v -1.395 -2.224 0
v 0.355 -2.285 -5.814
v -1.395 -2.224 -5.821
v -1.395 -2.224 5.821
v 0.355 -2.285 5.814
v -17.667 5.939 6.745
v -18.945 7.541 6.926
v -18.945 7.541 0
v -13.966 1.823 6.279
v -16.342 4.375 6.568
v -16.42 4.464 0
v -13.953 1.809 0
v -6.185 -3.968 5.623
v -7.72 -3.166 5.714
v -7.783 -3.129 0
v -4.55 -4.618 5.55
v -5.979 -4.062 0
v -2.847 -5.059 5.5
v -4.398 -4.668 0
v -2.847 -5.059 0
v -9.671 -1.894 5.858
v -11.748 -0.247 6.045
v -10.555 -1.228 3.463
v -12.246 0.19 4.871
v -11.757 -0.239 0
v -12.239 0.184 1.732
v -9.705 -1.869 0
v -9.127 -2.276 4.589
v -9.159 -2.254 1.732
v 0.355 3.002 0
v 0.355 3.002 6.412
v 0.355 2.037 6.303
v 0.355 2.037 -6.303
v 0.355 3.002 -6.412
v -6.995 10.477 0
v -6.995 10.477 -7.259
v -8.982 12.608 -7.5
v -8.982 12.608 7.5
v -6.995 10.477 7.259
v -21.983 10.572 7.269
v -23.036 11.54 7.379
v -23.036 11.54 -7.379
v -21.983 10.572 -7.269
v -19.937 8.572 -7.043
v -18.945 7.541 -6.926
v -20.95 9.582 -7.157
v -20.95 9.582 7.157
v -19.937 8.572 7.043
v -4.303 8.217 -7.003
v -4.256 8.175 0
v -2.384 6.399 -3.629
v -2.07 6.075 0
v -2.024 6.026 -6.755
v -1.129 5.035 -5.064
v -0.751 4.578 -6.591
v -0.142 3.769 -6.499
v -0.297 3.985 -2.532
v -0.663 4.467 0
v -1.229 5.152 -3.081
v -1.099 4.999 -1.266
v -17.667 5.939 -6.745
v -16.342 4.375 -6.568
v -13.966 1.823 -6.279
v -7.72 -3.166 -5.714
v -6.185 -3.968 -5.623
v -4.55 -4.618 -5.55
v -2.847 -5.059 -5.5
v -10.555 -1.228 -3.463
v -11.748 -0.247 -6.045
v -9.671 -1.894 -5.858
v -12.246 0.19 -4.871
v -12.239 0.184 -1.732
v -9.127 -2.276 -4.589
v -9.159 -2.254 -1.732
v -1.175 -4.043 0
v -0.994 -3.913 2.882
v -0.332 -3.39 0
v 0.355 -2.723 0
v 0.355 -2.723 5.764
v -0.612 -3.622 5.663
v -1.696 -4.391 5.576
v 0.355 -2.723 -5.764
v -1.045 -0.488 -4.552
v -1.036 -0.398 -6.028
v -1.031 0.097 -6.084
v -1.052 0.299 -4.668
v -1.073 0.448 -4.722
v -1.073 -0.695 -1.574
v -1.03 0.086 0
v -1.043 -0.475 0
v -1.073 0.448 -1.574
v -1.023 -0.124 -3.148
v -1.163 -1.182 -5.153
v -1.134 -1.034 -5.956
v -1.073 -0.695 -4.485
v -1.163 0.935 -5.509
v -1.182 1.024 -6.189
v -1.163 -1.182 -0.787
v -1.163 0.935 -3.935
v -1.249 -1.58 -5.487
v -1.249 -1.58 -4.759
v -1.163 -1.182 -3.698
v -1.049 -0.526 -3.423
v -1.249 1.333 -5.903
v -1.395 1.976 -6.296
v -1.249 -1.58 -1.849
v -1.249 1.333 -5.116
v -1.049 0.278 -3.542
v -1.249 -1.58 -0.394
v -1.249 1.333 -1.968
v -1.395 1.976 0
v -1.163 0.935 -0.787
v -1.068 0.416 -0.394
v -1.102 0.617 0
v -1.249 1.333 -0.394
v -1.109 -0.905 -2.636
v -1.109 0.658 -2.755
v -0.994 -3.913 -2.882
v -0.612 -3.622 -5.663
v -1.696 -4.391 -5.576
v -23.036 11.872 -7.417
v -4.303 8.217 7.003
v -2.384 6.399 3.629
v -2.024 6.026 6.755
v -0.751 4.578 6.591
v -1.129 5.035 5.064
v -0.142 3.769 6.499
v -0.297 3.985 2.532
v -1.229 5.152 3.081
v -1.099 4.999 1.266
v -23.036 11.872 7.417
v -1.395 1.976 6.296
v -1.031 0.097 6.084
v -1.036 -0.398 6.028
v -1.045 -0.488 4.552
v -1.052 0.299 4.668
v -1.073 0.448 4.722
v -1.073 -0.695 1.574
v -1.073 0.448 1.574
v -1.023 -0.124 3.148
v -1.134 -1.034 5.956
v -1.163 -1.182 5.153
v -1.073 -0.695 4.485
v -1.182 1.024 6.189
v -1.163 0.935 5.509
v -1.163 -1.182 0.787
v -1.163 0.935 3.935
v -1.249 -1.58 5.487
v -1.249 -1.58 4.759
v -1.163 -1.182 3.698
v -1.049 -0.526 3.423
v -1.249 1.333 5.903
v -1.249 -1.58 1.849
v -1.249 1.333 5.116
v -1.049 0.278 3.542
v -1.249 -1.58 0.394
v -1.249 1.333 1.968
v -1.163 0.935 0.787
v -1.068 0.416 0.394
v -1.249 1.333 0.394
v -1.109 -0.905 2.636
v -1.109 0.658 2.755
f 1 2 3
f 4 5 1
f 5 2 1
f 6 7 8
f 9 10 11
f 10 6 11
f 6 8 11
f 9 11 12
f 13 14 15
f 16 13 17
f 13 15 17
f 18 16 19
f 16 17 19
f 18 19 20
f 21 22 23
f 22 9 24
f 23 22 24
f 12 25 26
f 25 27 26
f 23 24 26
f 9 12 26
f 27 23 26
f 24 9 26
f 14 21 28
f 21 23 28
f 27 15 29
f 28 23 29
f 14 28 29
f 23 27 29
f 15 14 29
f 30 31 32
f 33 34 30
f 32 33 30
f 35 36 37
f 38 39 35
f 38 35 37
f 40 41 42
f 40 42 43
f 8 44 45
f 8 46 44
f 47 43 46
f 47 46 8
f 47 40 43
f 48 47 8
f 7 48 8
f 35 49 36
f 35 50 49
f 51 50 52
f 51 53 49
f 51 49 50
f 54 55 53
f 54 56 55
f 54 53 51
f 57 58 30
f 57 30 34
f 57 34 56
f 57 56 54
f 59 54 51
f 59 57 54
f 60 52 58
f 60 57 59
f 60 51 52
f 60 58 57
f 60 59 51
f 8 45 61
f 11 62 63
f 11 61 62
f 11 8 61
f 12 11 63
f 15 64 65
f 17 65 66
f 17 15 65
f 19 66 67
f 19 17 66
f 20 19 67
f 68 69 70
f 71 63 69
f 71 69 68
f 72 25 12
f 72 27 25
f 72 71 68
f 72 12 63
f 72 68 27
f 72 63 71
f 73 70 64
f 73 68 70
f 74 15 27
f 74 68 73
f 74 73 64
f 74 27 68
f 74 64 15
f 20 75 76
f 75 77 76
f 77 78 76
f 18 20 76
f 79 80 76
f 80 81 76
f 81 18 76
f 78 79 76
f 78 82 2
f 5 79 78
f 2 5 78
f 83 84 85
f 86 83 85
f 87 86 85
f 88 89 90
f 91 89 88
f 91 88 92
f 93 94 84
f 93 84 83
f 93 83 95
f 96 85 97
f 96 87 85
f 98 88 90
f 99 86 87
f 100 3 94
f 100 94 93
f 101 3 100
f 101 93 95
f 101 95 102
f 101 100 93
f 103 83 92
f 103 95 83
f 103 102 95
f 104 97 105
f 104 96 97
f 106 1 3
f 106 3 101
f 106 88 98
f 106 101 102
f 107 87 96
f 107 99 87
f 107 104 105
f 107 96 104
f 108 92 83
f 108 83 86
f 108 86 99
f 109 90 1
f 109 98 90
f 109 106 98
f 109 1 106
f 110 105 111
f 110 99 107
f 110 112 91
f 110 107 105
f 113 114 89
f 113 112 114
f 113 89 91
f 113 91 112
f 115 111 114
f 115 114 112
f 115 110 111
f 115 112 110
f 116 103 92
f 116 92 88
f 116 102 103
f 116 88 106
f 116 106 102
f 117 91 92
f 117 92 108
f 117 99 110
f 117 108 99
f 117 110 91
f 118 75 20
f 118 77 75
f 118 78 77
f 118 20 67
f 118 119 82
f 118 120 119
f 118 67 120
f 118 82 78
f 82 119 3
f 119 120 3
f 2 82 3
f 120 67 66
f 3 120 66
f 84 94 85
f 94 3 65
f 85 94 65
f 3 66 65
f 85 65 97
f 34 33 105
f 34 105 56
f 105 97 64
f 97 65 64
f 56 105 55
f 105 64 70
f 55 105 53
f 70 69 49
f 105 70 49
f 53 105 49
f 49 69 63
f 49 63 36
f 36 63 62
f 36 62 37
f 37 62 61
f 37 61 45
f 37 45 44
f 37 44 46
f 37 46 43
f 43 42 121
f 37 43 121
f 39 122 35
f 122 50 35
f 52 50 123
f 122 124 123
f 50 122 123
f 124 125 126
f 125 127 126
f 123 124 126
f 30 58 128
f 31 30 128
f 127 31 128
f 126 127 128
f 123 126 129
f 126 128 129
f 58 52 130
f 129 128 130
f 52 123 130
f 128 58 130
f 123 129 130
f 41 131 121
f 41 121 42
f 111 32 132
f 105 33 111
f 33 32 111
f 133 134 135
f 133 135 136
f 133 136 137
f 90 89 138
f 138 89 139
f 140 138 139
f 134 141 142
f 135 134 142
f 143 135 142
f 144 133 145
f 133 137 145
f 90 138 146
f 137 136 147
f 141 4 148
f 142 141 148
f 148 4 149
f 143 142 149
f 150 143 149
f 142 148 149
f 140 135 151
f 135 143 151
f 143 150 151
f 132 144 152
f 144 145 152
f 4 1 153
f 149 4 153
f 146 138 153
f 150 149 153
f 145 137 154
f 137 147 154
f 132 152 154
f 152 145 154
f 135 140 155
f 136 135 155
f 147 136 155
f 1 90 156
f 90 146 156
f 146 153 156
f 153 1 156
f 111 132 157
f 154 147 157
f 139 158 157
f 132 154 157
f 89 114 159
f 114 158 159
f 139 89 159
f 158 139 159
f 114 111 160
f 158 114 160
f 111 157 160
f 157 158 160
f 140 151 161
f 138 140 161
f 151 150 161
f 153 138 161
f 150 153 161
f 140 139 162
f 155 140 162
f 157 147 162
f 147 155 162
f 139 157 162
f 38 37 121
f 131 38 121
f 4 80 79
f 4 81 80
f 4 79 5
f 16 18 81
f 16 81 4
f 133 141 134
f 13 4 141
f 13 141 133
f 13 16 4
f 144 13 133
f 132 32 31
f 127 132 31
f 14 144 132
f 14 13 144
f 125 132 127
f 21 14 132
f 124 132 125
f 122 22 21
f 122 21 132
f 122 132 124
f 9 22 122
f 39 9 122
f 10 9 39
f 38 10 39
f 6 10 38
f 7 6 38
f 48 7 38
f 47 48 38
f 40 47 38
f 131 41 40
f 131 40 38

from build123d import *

# Parameters (mm, degrees)
SALIENTE_EXTRUIR1_DEPTH      = 7.5
SALIENTE_EXTRUIR2_DEPTH      = 7.5
SALIENTE_EXTRUIR2_DEPTH_BACK = 7.5
CORTAR_EXTRUIR2_DEPTH        = 28.310606886
CORTAR_EXTRUIR2_DEPTH_BACK   = 28.310606886


with BuildPart() as part:
    # Croquis1 → Saliente-Extruir1 (new, symmetric)
    with BuildSketch(Plane.XY):
        with BuildLine():
            add(Edge.make_bspline(
                [(-18.945192114, 7.540918896), (-10.215008384, -3.697644103), (-2.846604825, -5.059081104)],
                knots=[0.497667241, 0.497667241, 0.497667241, 0.49955428, 0.49955428, 0.49955428], degree=2, weights=[1, 1, 1]))
            add(Edge.make_bspline(
                [(-2.846604825, -5.059081104), (-0.742366882, -3.9352066), (0.355125, -2.723253227)],
                knots=[0.498812075, 0.498812075, 0.498812075, 0.499412845, 0.499412845, 0.499412845], degree=2, weights=[1, 1, 1]))
            Line((0.355125, -2.723253227), (0.355125, -2.284841781))
            Line((0.355125, -2.284841781), (-1.394875, -2.223730435))
            add(Edge.make_bspline(
                [(-1.394875, -2.223730435), (-0.90753067, -0.123730435), (-1.394875, 1.976269565)],
                knots=[0, 0, 0, 1, 1, 1], degree=2, weights=[1, 3.231801219, 1]))
            Line((-1.394875, 1.976269565), (0.355125, 2.284841781))
            Line((0.355125, 2.284841781), (0.355125, 3.001549529))
            add(Edge.make_bspline(
                [(0.355125, 3.001549529), (-1.44872627, 6.058427314), (-6.994875026, 10.477389992)],
                knots=[0.500820705, 0.500820705, 0.500820705, 0.502013312, 0.502013312, 0.502013312], degree=2, weights=[1, 1, 1]))
            Line((-6.994875026, 10.477389992), (-8.981845695, 12.608155172))
            Line((-8.981845695, 12.608155172), (-23.035921146, 11.871612288))
            Line((-23.035921146, 11.871612288), (-23.035921146, 11.54013782))
            ThreePointArc((-23.035921146, 11.54013782), (-20.949684518, 9.582335705), (-18.945192114, 7.540918896))
        make_face()
    extrude(amount=SALIENTE_EXTRUIR1_DEPTH, both=True)

    # Croquis4 → Saliente-Extruir2 (add, two sides: drawn at the far end of the back side and taken through both)
    with BuildSketch(Plane.XY.offset(-SALIENTE_EXTRUIR2_DEPTH_BACK)):
        Polygon((-1.394875, 1.976269565), (0.355125, 2.284841781), (0.355125, 2.037380912), align=None)
    extrude(amount=SALIENTE_EXTRUIR2_DEPTH + SALIENTE_EXTRUIR2_DEPTH_BACK)

    # Croquis6 → Cortar-Extruir2 (cut, two sides: drawn at the far end of the back side and taken through both)
    with BuildSketch(Plane(origin=(0, 0, 0), x_dir=(0, 0, -1), z_dir=(1, 0, 0)).offset(-CORTAR_EXTRUIR2_DEPTH_BACK)):
        Polygon((7.5, 12.608155172), (7.5, -5.059081104), (5.5, -5.059081104), align=None)
        Polygon((-7.5, 12.608155172), (-7.5, -5.059081104), (-5.5, -5.059081104), align=None)
    extrude(amount=CORTAR_EXTRUIR2_DEPTH + CORTAR_EXTRUIR2_DEPTH_BACK, mode=Mode.SUBTRACT)


solid = part.part
